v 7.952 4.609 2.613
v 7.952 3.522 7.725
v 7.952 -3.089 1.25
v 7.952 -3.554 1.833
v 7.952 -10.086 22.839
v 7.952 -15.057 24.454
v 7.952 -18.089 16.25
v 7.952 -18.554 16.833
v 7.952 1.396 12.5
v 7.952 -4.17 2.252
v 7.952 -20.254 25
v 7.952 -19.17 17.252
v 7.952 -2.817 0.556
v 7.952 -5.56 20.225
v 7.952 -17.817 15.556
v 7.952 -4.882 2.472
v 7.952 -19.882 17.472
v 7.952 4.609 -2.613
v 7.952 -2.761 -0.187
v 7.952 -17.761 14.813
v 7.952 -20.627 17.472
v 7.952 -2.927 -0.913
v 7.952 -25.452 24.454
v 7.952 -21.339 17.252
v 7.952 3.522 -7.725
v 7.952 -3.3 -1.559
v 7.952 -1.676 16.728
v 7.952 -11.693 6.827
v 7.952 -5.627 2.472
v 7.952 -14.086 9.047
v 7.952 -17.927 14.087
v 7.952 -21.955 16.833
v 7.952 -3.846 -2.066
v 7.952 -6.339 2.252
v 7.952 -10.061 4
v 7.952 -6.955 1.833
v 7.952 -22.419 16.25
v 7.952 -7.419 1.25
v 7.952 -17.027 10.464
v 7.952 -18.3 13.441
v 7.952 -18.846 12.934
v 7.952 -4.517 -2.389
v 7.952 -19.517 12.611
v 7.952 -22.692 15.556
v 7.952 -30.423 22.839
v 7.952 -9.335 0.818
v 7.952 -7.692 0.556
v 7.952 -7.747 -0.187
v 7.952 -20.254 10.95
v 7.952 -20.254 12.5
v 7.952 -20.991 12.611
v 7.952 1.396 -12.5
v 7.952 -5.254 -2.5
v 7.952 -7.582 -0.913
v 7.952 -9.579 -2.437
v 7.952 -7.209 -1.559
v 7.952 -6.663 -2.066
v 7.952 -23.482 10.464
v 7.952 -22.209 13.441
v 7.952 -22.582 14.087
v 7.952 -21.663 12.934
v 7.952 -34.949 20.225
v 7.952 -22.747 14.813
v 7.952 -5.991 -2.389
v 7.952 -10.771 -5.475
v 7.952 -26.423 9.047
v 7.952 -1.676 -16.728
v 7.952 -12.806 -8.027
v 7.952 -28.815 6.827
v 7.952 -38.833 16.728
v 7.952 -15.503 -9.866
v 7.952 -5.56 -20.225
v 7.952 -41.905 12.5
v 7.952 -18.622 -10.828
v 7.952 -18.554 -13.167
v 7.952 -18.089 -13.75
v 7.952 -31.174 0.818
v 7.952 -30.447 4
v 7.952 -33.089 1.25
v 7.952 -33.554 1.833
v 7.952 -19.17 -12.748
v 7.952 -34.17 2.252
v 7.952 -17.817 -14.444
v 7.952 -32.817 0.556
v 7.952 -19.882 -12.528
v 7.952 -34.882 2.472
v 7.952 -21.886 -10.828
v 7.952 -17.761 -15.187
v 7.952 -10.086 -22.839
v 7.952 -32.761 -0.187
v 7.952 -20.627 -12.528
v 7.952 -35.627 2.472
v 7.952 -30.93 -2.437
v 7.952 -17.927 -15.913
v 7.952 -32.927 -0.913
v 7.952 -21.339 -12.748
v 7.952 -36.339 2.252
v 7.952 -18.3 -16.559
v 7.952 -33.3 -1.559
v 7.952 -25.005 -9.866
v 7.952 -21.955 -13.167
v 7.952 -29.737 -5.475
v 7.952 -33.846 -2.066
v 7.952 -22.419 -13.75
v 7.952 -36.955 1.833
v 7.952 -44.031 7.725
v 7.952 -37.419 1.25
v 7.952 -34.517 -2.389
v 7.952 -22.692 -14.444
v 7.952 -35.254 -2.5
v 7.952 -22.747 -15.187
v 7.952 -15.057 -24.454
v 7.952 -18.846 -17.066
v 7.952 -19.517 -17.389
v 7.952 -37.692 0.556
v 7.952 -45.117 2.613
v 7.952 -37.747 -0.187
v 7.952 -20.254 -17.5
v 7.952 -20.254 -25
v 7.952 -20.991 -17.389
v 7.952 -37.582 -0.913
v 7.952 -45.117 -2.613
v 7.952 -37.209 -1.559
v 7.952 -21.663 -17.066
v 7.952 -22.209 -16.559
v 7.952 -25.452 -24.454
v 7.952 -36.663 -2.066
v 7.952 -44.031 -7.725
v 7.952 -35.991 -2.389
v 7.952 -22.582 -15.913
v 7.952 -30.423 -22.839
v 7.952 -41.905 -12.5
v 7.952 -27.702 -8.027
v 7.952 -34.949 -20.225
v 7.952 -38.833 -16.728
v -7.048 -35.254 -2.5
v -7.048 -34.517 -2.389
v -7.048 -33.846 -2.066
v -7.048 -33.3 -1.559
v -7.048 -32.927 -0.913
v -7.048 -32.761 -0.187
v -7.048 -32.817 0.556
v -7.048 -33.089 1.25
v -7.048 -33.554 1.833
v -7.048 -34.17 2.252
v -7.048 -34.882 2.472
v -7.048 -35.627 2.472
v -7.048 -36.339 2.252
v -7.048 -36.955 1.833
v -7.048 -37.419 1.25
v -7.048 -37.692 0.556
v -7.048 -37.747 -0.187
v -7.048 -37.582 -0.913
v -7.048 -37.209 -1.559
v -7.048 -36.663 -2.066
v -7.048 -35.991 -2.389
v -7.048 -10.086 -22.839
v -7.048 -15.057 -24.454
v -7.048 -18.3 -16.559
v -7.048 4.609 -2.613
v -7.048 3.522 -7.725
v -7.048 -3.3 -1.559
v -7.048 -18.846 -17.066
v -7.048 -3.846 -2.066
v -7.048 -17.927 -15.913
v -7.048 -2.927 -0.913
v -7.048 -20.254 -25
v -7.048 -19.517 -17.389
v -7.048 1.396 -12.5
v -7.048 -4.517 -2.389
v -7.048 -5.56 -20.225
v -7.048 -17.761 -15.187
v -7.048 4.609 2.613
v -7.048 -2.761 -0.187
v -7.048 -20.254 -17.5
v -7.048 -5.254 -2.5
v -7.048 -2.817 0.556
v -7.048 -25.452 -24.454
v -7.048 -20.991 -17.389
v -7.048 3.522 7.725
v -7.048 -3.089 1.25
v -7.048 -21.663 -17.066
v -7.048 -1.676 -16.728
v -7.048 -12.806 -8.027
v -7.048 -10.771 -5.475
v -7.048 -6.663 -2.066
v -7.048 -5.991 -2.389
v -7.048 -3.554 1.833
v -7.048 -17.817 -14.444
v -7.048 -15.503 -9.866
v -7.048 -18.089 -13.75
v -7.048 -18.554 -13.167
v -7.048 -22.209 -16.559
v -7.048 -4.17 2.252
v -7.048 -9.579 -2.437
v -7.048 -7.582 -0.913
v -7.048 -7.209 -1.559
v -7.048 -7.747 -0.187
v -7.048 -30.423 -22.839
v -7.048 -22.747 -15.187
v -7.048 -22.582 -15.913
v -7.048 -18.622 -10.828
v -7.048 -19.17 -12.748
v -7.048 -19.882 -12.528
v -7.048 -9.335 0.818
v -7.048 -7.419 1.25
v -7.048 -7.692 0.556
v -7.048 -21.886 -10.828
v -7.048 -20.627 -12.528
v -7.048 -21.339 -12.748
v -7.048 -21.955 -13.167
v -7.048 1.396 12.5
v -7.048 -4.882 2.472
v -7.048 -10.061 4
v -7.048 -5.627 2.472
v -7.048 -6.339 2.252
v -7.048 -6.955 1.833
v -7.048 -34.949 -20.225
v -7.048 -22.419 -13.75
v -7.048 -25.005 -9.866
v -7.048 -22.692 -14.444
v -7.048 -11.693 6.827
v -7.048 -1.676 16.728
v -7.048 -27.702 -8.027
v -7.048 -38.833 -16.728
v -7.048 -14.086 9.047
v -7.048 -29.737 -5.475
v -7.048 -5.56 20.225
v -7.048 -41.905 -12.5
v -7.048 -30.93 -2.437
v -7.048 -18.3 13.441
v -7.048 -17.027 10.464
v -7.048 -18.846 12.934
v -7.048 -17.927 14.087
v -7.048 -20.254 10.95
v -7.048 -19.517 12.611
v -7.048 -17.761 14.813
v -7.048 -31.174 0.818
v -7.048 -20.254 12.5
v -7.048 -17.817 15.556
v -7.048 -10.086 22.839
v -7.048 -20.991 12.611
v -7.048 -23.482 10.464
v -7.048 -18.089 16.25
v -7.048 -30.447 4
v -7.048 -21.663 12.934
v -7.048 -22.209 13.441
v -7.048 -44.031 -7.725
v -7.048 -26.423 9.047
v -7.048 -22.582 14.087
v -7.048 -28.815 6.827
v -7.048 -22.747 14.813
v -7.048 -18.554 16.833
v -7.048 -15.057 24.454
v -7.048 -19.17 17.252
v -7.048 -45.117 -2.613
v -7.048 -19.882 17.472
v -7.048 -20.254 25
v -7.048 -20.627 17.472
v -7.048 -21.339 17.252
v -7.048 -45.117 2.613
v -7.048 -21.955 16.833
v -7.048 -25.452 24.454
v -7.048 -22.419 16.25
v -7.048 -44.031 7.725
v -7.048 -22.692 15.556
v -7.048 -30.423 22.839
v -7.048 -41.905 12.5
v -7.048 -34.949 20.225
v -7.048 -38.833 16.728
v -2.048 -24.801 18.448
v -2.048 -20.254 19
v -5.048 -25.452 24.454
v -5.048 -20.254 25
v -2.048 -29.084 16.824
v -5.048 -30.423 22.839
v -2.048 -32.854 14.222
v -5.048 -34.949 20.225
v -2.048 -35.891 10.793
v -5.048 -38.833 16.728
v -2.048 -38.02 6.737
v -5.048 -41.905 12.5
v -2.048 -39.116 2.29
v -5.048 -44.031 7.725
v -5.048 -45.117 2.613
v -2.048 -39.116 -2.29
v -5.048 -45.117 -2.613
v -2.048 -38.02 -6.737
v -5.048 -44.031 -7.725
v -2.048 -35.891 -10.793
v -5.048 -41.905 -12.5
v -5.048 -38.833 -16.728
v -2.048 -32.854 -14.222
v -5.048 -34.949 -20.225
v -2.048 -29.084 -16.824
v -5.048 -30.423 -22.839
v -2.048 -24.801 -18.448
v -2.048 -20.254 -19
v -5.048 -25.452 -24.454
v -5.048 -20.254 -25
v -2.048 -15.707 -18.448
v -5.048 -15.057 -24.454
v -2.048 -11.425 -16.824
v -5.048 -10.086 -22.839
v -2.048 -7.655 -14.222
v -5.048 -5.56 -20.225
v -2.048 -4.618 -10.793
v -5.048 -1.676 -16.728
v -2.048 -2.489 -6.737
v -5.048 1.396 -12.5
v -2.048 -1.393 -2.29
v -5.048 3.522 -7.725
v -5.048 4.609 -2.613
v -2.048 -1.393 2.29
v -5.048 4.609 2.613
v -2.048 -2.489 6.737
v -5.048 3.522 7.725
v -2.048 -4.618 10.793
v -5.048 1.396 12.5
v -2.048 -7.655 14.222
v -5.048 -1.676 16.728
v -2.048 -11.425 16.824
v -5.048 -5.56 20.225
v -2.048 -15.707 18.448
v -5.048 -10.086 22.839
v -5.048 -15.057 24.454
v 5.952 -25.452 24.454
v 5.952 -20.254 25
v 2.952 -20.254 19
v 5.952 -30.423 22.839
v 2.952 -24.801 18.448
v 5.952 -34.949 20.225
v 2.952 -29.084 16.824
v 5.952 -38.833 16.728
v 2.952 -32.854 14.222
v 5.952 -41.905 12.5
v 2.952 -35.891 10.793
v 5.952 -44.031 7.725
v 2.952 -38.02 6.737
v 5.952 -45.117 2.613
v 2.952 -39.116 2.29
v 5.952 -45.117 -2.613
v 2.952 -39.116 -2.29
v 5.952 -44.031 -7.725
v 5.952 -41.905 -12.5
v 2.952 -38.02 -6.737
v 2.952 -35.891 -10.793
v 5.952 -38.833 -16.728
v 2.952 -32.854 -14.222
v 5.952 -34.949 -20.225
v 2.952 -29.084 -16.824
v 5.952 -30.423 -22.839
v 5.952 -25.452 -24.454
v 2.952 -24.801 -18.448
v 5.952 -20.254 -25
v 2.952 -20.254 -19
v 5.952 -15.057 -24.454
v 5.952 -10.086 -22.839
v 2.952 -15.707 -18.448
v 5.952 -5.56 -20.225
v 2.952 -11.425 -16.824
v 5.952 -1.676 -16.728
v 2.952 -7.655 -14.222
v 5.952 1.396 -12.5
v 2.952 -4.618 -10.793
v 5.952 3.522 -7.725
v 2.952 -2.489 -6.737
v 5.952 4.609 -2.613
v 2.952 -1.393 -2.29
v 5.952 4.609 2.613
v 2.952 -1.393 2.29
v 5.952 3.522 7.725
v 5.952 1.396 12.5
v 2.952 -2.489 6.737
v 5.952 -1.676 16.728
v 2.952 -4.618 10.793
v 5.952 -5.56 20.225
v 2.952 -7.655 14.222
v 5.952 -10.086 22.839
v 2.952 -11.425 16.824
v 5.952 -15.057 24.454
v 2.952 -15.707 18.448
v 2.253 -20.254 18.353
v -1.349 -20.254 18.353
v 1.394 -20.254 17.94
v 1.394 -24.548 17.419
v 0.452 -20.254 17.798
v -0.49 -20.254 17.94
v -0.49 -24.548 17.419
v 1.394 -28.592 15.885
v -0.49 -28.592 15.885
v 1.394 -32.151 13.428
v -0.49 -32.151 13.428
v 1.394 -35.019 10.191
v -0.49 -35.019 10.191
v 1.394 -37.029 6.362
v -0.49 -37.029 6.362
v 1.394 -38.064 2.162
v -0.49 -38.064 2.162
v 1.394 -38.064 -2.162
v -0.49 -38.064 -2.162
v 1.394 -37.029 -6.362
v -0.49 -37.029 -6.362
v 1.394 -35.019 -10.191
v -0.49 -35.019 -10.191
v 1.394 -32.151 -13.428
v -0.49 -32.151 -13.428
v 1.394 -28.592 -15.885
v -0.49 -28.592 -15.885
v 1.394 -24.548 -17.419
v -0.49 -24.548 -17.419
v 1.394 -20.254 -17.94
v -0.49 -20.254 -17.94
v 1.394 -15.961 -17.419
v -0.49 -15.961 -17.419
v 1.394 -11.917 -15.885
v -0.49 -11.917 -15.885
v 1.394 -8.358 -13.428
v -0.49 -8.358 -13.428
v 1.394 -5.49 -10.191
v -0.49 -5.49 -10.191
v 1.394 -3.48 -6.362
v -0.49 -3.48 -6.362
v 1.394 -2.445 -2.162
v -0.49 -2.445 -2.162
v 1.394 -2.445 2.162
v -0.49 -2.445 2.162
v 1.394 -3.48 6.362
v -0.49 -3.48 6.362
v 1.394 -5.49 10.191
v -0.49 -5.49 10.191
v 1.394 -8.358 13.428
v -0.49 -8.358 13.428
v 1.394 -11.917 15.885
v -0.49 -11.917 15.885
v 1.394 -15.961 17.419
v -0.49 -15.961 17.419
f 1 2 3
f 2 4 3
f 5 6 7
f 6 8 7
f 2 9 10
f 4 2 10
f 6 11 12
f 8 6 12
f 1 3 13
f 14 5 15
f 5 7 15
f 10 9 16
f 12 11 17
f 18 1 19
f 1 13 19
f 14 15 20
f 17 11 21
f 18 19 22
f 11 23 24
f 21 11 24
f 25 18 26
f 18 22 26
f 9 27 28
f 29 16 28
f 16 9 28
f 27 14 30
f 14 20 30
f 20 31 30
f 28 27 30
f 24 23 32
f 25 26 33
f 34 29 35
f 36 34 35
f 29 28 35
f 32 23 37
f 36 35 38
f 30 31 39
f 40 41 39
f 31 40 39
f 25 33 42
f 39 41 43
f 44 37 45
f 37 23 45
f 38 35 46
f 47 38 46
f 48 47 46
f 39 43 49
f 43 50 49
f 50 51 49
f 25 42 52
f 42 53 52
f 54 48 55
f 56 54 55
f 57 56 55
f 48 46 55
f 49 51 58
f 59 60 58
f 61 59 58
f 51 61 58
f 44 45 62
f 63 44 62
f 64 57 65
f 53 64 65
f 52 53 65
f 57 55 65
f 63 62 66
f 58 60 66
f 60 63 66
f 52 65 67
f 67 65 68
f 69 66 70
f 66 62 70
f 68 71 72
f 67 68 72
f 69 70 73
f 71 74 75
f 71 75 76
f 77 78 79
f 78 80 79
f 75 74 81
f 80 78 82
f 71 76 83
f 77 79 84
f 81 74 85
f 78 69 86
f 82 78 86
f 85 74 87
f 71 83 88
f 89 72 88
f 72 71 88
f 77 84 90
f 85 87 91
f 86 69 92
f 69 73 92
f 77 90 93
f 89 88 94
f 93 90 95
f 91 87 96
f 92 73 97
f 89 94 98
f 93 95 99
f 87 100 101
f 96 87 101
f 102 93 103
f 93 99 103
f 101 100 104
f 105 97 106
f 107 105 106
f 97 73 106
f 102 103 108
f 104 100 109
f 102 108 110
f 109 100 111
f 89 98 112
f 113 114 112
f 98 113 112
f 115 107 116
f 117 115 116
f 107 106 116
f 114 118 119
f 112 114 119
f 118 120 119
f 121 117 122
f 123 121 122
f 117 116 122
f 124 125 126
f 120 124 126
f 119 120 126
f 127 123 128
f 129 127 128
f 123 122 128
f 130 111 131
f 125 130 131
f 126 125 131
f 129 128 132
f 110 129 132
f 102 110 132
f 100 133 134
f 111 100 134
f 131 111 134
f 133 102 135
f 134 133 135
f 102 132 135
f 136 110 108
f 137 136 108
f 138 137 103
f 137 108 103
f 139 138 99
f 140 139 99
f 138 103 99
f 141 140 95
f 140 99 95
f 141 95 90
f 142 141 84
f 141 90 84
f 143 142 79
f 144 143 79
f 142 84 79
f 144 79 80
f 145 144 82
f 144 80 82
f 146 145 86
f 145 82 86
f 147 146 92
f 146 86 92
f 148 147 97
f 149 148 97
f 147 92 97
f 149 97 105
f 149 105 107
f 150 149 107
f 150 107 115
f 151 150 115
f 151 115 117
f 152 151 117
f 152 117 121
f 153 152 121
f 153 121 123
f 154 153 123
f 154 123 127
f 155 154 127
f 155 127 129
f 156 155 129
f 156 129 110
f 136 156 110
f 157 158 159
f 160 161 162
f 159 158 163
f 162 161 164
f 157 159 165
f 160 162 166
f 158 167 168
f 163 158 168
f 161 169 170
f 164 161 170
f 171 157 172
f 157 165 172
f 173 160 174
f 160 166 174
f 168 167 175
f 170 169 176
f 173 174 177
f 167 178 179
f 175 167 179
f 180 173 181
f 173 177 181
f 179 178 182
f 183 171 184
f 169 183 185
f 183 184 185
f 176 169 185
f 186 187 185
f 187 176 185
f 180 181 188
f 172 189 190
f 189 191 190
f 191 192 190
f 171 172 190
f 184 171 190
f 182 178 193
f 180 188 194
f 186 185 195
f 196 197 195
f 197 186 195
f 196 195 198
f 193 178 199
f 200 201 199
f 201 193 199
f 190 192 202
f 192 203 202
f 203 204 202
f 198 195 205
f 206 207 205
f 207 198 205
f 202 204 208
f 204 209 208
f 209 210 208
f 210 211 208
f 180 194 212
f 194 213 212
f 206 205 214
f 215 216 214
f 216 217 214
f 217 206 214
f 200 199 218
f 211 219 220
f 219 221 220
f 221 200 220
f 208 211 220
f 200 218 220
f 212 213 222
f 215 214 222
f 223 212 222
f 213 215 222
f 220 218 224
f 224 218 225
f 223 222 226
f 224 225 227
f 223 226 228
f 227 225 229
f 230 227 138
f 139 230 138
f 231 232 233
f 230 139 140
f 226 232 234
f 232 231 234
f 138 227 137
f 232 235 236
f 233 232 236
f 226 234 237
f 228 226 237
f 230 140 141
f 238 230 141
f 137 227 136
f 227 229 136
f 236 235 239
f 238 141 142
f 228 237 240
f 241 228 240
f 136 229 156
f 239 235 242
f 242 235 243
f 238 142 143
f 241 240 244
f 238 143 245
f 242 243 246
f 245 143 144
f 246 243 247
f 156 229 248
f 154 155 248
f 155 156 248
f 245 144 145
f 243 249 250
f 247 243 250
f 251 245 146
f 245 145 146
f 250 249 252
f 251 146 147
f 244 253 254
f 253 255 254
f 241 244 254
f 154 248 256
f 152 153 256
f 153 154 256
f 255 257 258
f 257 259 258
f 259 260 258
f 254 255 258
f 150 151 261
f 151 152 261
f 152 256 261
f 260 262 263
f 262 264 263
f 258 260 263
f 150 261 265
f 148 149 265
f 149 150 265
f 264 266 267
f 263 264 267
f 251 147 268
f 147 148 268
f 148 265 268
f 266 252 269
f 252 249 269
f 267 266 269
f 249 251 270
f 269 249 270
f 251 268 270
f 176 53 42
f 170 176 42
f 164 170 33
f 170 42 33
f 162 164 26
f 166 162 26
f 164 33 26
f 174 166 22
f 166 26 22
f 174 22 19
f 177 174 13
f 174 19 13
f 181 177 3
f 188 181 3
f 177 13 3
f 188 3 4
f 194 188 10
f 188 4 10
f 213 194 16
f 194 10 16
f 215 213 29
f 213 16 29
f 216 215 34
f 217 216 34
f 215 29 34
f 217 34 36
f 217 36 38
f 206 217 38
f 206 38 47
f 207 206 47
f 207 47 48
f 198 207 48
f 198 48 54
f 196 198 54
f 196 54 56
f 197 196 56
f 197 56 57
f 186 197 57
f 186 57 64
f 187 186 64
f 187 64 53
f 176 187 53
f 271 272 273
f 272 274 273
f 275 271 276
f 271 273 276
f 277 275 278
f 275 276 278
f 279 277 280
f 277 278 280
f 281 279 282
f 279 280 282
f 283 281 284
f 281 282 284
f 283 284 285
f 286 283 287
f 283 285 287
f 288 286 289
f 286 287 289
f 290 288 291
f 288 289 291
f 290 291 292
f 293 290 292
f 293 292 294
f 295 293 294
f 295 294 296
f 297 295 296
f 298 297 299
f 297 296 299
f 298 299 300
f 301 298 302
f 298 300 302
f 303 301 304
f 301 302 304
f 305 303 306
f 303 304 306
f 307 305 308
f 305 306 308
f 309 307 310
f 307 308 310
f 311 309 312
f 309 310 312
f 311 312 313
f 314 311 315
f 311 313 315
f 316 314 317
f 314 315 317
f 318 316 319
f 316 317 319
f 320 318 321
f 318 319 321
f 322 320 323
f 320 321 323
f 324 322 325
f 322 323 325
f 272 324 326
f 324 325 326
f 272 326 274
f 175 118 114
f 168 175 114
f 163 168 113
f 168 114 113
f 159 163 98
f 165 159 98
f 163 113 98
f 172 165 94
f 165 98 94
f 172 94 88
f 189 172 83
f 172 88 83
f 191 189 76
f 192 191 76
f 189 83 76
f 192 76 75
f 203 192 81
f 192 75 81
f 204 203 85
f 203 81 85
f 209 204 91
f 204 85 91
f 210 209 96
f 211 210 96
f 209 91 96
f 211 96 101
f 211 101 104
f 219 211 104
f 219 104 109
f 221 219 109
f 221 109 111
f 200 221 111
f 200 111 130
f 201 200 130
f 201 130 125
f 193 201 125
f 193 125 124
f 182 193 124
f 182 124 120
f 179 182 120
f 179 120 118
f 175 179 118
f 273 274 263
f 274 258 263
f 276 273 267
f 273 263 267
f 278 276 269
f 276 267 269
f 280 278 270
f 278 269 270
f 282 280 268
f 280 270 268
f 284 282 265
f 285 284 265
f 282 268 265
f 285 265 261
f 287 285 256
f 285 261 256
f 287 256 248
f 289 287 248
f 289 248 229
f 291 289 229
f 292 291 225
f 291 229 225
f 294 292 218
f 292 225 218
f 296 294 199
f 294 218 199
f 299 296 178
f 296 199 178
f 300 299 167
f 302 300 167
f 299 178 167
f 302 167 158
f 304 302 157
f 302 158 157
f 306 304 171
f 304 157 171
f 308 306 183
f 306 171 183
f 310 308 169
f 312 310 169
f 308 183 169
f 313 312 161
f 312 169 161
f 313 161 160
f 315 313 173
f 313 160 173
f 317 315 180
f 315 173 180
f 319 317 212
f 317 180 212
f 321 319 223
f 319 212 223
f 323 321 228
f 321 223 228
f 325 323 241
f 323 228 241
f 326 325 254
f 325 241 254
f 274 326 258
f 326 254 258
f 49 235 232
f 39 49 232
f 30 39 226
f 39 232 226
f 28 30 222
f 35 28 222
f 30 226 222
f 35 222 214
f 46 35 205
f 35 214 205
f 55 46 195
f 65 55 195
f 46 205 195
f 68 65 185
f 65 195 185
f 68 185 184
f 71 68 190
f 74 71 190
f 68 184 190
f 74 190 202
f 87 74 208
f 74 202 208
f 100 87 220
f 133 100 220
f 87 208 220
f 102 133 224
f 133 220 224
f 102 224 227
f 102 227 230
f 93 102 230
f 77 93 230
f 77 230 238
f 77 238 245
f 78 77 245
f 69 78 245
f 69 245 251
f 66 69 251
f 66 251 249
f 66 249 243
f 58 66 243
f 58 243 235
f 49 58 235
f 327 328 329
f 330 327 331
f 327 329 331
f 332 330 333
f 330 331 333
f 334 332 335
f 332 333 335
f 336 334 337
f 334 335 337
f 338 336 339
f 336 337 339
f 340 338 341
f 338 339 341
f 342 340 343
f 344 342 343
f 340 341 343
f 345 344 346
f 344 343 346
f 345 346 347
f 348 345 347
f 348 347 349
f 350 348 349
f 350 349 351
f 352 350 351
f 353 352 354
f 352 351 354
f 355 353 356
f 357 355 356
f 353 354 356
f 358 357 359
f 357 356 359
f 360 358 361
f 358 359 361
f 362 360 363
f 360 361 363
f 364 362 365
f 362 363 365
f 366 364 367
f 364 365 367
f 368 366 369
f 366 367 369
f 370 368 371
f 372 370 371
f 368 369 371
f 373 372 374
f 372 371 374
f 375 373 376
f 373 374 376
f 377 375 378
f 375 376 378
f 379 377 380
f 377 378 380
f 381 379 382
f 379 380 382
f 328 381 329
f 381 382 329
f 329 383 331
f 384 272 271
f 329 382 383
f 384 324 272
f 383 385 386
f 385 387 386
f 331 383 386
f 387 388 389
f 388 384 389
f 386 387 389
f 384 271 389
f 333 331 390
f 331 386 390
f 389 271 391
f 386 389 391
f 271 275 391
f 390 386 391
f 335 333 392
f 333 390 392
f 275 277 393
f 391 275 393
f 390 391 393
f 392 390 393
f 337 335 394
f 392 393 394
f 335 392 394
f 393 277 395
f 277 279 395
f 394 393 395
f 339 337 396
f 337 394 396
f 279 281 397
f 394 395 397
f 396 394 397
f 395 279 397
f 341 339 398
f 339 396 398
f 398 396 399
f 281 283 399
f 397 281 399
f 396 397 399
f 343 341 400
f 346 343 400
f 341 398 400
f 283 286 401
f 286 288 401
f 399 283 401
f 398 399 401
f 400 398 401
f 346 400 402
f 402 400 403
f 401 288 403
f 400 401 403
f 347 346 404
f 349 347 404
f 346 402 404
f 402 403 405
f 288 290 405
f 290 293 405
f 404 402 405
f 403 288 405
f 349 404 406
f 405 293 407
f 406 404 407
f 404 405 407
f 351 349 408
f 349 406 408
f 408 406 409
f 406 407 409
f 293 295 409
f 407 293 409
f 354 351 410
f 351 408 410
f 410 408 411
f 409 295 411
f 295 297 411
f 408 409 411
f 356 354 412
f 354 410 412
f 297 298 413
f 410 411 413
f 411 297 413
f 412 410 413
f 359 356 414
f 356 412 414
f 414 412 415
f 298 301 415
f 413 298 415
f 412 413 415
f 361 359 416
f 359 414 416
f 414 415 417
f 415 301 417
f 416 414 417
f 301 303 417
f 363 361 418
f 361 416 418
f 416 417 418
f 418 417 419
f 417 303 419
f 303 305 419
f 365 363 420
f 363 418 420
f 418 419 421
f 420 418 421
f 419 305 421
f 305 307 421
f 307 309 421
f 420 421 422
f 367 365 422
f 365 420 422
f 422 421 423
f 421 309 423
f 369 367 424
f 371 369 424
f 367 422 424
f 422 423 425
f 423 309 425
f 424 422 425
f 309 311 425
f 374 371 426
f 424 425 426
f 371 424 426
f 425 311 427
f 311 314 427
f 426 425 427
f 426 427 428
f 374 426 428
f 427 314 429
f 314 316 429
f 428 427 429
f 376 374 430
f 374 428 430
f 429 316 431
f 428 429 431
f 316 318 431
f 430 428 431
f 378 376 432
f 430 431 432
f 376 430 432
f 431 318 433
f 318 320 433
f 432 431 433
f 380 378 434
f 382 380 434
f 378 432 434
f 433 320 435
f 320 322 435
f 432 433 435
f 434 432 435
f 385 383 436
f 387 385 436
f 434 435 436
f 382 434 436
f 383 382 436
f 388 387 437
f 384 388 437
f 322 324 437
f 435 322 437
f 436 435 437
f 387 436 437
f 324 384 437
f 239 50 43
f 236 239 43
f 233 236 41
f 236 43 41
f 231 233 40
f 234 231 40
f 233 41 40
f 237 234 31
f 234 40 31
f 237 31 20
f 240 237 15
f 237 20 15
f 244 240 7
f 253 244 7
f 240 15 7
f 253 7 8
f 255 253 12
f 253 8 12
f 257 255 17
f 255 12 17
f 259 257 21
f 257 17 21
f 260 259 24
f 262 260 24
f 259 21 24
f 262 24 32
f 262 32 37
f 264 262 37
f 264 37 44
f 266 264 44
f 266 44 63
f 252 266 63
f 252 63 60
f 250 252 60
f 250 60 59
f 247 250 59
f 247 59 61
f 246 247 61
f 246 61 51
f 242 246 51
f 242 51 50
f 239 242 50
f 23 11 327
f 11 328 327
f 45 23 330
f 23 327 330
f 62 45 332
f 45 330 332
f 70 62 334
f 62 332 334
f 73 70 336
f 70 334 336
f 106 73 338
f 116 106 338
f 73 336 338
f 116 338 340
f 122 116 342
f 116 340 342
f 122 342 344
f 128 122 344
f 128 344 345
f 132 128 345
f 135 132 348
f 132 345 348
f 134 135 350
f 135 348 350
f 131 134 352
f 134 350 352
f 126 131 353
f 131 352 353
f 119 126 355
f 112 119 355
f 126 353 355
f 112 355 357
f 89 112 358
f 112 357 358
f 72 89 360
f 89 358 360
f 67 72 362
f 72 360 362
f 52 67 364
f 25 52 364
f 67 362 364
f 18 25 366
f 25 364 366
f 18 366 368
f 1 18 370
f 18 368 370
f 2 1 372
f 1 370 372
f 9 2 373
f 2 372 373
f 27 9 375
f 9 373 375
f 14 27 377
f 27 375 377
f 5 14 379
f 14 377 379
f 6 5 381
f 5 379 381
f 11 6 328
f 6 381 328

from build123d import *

# Parameters (mm, degrees)
CROQUIS2_R            = 3.95
CORTAR_EXTRUIR1_DEPTH = 14
CROQUIS3_R            = 10.95
CORTAR_EXTRUIR2_DEPTH = 115.8
CROQUIS4_R            = 2.5
CORTAR_EXTRUIR3_DEPTH = 43


with BuildPart() as part:
    # Croquis1 → Revolución1 (revolve)
    with BuildSketch(Plane.XY, mode=Mode.PRIVATE) as revoluci_n1_sk:
        with BuildLine():
            Line((5.952239129, 4.74561549), (2.952239129, -1.25438451))
            ThreePointArc((2.952239129, -1.25438451), (0.452239129, -2.455946629), (-2.047760871, -1.25438451))
            Line((-2.047760871, -1.25438451), (-5.047760871, 4.74561549))
            Line((-5.047760871, 4.74561549), (-7.047760871, 4.74561549))
            Line((-7.047760871, 4.74561549), (-7.047760871, -20.25438451))
            Line((-7.047760871, -20.25438451), (7.952239129, -20.25438451))
            Line((7.952239129, -20.25438451), (7.952239129, 4.74561549))
            Line((7.952239129, 4.74561549), (5.952239129, 4.74561549))
        make_face()
    revolve(revoluci_n1_sk.sketch.rotate(Axis((-20.844407183, -20.25438451, 0), (1, 0, 0)), 90), axis=Axis((-20.844407183, -20.25438451, 0), (1, 0, 0)))

    # Croquis2 → Cortar-Extruir1 (cut)
    with BuildSketch(Plane.ZY.offset(7.047760871)):
        with Locations((0, -20.25438451)):
            Circle(CROQUIS2_R)
    extrude(amount=-CORTAR_EXTRUIR1_DEPTH, mode=Mode.SUBTRACT)

    # Croquis3 → Cortar-Extruir2 (cut)
    with BuildSketch(Plane.ZY.offset(7.047760871)):
        with Locations((0, -20.25438451)):
            Circle(CROQUIS3_R)
    extrude(amount=-CORTAR_EXTRUIR2_DEPTH, mode=Mode.SUBTRACT)

    # Croquis4 → Cortar-Extruir3 (cut)
    with BuildSketch(Plane(origin=(7.952239129, 0, 0), x_dir=(0, 0, -1), z_dir=(1, 0, 0))):
        with Locations((-15, -20.25438451)):
            Circle(CROQUIS4_R)
        with Locations((0, -35.25438451)):
            Circle(CROQUIS4_R)
        with Locations((15, -20.25438451)):
            Circle(CROQUIS4_R)
        with Locations((0, -5.25438451)):
            Circle(CROQUIS4_R)
    extrude(amount=-CORTAR_EXTRUIR3_DEPTH, mode=Mode.SUBTRACT)


solid = part.part
